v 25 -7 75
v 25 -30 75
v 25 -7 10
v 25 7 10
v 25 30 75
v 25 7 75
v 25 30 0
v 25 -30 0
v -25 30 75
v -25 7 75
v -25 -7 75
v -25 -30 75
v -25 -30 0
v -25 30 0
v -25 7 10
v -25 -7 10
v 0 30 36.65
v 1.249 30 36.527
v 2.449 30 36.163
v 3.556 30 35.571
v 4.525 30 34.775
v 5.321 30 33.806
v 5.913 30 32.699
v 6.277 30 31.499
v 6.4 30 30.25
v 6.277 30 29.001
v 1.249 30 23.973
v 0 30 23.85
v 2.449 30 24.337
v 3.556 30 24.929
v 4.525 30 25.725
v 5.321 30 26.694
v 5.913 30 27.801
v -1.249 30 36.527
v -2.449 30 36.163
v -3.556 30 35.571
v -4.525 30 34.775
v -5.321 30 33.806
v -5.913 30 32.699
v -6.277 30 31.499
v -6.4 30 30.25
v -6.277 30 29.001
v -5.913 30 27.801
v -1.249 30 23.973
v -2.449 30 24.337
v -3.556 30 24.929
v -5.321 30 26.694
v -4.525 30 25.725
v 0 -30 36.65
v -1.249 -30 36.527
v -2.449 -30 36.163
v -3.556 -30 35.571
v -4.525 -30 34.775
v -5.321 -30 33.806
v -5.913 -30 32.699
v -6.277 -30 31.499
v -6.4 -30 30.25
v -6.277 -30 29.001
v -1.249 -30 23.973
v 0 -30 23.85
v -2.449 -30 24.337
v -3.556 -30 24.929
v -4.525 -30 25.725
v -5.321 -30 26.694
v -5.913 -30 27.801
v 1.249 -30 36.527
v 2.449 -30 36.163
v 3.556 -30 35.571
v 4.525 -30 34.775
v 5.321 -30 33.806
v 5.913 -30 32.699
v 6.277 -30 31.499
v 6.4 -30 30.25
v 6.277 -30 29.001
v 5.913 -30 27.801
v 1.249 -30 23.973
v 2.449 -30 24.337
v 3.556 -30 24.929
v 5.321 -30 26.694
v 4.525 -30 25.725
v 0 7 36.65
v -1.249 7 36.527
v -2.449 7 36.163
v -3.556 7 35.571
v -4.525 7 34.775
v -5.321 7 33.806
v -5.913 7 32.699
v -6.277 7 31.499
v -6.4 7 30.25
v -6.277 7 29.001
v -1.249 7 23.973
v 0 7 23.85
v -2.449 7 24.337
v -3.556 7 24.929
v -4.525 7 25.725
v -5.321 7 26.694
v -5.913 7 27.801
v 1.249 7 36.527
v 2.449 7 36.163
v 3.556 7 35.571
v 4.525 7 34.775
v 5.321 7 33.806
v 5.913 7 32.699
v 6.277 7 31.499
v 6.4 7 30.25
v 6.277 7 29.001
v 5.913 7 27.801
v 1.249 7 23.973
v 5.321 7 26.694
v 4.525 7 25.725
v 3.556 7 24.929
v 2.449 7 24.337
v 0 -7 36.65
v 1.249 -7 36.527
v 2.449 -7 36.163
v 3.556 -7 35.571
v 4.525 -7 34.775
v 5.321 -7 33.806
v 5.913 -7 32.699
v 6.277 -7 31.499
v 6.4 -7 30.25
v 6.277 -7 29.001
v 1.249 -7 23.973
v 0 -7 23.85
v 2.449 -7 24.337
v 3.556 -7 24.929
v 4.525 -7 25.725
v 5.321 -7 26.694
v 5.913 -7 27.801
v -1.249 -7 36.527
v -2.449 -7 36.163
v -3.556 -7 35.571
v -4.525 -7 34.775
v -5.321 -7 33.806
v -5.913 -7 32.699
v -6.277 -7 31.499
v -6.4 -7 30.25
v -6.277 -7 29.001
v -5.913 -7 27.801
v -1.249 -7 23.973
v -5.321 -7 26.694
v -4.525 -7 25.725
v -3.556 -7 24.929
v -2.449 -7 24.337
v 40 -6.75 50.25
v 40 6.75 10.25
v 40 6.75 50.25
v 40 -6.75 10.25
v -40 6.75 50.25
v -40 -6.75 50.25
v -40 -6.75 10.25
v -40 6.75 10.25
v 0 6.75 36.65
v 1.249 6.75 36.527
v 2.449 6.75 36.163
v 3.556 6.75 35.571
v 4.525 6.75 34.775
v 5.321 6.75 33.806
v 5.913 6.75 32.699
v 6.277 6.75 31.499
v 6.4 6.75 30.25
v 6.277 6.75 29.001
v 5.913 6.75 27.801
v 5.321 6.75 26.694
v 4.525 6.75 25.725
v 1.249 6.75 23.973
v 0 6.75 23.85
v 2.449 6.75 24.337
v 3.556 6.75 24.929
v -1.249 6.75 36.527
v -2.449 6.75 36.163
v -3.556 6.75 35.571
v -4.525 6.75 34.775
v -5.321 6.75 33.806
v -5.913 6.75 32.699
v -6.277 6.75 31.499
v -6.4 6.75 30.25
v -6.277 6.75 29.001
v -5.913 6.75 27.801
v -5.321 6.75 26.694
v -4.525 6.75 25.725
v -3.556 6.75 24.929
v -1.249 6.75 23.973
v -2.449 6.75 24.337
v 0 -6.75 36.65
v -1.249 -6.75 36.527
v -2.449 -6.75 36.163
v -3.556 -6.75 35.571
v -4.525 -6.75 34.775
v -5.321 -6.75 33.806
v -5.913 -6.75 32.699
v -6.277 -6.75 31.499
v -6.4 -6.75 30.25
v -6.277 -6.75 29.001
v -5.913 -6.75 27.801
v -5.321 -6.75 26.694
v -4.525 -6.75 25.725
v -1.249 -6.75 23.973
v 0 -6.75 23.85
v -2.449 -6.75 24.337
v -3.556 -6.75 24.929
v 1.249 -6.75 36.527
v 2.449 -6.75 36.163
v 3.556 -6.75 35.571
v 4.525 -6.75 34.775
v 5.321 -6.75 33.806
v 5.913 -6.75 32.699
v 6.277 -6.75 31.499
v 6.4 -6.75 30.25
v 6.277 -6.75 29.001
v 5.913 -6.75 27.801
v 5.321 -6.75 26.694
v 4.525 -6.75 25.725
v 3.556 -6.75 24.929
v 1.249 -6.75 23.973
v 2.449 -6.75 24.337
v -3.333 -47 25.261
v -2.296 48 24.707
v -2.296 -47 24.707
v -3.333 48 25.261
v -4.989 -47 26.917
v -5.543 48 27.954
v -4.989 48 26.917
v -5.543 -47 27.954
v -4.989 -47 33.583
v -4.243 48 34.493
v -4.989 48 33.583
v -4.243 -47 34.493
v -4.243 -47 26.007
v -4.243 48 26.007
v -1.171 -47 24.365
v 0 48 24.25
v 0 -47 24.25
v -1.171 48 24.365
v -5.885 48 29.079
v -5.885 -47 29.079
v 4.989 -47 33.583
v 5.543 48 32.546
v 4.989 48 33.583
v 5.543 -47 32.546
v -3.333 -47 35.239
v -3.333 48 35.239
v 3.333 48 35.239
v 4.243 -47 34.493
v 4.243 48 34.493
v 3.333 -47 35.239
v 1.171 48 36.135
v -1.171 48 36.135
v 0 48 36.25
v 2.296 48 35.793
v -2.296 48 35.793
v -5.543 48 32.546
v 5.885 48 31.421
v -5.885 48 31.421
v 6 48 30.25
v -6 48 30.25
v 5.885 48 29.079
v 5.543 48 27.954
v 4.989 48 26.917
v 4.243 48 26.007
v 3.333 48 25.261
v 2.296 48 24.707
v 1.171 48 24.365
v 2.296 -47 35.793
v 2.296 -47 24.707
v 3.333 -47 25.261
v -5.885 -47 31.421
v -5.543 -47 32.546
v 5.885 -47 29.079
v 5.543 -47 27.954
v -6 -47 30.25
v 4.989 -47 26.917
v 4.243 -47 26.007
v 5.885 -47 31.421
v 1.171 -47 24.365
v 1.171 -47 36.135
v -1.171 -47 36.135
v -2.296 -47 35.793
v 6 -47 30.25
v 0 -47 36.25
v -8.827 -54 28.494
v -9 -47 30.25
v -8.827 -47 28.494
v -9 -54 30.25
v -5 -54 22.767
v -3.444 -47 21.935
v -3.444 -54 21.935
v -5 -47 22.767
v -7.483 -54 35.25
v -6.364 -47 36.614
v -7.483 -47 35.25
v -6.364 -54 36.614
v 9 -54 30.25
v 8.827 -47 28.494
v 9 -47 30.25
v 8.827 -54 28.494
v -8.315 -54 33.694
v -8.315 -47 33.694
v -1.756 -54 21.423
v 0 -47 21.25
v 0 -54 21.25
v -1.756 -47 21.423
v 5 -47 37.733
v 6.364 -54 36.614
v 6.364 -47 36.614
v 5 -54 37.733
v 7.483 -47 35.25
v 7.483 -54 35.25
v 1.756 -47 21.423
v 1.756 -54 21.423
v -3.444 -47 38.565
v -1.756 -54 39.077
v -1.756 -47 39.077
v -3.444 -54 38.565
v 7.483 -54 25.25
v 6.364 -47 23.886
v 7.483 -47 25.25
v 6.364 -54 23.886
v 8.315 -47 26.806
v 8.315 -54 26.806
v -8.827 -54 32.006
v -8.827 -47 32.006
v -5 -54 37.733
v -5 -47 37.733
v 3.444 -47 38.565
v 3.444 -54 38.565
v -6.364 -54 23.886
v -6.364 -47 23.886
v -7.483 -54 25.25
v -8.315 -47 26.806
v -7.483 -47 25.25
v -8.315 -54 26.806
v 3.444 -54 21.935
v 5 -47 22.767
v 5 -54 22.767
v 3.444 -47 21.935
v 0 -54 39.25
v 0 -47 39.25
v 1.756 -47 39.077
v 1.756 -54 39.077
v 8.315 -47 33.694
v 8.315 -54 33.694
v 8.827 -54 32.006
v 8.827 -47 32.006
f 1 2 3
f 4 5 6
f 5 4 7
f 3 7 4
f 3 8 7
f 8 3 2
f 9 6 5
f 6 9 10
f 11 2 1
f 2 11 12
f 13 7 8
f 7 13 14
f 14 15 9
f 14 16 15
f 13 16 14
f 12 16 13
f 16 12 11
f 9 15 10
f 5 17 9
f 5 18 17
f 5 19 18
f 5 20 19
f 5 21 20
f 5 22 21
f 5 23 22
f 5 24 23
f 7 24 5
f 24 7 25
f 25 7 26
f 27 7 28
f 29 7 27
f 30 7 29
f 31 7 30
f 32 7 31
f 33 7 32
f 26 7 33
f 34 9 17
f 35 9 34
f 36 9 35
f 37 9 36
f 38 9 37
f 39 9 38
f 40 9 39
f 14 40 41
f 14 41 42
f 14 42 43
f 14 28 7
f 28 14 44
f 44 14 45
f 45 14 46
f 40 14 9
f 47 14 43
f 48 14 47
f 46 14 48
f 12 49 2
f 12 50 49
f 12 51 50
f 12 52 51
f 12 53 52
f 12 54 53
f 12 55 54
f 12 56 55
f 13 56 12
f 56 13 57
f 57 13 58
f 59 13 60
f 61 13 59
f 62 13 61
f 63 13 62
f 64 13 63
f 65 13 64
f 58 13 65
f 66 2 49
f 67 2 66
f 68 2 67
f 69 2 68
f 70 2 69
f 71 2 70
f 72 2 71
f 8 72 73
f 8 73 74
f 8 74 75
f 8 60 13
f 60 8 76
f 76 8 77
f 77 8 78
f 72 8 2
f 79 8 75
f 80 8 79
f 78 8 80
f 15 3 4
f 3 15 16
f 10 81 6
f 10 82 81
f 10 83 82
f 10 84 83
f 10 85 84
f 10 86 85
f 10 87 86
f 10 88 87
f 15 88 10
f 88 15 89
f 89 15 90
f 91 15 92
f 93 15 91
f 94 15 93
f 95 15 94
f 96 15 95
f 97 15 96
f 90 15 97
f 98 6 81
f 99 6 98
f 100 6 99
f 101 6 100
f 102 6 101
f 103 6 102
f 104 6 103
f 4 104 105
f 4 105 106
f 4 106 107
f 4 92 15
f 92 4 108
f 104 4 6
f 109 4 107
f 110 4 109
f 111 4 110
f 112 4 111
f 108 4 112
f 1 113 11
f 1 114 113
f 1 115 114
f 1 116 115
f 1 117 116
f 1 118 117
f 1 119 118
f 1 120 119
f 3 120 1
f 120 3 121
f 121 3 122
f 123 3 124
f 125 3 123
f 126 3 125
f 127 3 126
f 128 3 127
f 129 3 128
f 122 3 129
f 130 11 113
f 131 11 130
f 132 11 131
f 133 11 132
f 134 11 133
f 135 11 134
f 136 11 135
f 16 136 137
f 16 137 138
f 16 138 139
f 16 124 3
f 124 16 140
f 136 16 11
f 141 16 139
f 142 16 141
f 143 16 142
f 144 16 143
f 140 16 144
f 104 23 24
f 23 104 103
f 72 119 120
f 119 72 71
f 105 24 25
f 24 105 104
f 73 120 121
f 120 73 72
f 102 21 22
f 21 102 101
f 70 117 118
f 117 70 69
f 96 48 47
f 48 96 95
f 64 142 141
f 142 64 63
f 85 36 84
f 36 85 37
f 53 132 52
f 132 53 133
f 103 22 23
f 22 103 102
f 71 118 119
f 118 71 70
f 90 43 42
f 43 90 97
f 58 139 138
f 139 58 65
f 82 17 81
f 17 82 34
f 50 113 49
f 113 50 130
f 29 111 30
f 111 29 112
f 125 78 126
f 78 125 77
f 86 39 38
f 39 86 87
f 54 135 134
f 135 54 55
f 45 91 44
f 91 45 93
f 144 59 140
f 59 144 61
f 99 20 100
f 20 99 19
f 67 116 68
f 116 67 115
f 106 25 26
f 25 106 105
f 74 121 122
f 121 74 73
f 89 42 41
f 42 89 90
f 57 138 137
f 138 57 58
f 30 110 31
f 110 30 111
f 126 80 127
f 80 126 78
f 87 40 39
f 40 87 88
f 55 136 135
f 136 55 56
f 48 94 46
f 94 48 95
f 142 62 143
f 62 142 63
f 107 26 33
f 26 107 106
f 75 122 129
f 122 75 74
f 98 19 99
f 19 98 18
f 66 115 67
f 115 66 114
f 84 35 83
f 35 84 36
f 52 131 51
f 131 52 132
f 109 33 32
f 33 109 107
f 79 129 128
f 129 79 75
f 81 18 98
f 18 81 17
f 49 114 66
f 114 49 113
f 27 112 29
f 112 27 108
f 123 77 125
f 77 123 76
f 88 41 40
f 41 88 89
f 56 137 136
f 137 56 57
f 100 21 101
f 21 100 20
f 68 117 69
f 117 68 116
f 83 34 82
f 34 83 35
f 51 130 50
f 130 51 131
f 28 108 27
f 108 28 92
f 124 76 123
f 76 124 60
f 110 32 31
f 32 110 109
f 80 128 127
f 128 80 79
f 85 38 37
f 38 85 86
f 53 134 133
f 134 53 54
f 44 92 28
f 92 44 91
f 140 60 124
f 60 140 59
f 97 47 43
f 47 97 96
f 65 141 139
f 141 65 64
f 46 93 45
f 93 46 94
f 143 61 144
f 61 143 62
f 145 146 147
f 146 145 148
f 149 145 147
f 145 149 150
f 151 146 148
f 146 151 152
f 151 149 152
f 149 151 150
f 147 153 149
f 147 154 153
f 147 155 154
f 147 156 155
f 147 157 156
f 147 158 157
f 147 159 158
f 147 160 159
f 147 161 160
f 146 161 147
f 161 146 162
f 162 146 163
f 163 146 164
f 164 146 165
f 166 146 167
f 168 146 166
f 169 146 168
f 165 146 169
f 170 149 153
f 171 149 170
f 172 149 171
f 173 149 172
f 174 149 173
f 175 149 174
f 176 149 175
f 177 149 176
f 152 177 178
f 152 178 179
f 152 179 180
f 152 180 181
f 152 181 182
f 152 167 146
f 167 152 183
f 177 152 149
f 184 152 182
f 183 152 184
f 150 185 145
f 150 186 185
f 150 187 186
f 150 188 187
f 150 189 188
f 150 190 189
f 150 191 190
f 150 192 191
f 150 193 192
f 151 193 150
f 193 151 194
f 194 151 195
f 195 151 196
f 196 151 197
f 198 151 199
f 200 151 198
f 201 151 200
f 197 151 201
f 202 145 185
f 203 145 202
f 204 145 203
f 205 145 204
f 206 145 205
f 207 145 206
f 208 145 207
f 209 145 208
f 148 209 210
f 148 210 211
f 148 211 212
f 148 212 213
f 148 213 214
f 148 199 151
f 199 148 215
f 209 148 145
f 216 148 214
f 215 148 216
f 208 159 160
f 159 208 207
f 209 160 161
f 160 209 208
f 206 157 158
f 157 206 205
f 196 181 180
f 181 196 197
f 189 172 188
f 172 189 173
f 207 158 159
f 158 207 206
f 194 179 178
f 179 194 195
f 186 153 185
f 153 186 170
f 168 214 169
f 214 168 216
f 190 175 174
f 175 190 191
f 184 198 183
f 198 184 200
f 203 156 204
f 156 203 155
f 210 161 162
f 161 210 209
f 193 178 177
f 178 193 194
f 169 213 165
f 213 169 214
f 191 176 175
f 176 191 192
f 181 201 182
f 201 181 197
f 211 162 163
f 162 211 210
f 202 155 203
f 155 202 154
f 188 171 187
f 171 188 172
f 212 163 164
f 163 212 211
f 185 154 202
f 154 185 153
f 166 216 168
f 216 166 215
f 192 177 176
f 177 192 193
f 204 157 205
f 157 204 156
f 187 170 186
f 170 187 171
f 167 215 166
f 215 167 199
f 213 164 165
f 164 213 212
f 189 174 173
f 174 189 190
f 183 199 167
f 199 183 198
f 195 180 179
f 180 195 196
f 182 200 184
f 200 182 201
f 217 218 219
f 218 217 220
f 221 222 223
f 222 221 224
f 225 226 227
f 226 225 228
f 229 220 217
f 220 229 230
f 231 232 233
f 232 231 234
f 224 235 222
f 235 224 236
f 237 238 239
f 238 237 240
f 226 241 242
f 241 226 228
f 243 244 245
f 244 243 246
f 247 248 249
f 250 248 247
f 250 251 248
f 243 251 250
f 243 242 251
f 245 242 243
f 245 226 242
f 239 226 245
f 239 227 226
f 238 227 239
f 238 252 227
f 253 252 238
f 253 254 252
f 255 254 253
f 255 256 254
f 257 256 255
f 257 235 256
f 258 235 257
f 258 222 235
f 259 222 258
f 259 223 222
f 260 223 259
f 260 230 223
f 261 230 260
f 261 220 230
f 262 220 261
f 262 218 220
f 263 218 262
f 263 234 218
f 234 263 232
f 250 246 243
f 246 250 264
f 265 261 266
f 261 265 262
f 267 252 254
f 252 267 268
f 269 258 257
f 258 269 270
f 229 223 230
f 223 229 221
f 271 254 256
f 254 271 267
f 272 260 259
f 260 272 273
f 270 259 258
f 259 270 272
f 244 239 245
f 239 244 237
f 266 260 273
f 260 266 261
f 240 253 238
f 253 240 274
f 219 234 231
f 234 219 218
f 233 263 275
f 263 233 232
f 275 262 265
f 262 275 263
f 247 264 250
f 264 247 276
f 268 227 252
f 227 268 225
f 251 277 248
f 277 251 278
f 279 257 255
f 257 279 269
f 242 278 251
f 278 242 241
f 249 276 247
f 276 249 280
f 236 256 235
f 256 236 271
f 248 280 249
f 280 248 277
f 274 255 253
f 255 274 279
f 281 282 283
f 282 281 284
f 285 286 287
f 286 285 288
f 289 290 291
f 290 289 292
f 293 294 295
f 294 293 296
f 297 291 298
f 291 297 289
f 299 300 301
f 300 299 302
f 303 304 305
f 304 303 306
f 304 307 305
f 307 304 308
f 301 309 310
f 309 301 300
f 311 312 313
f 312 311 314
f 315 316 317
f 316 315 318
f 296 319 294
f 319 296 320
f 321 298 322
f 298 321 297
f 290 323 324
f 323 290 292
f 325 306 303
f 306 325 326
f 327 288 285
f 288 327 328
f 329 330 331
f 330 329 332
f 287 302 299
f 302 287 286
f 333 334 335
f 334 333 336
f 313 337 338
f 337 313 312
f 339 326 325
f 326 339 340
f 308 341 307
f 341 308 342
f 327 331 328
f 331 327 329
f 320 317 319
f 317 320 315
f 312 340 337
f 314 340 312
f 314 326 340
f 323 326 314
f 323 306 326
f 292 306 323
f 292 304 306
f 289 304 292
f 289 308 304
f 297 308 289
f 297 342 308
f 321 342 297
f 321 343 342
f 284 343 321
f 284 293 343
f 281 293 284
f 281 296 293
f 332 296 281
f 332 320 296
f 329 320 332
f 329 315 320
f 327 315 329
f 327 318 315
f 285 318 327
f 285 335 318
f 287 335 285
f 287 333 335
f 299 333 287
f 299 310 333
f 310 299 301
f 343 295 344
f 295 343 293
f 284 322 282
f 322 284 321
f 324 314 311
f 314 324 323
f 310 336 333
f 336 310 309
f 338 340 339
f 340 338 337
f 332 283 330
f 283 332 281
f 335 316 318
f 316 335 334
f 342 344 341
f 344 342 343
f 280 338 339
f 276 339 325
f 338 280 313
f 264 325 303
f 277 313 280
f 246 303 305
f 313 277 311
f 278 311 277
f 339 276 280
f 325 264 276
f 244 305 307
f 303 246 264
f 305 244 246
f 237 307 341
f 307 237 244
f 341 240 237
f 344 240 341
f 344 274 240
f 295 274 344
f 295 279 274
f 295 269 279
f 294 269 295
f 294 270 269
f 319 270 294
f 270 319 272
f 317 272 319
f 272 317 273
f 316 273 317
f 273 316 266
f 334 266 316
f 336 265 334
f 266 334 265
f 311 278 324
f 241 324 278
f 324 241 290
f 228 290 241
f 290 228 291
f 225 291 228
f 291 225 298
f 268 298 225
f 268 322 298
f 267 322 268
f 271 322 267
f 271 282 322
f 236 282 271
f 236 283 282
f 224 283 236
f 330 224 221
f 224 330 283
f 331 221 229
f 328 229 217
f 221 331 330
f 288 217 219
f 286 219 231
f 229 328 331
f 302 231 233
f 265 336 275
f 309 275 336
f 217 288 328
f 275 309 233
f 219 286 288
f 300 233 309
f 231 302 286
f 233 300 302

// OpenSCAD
$fn = 32;

// ------------------------------------------------------------------------
// Clevis joint: 50 mm clevis, pin d12
// Every part is its own module, assembly() places them once.
// ------------------------------------------------------------------------

// --- part 1 ---
module clevis() {
  difference() {
    translate([-25, -30, 0]) cube([50, 60, 75]);
    translate([-26, -7, 10]) cube([52, 14, 66]);
    translate([0, 0, 30.25]) rotate([90, 0, 0]) cylinder(h = 62, d = 12.8, center = true);
  }
}

// --- part 2 ---
module eye() {
  difference() {
    translate([-40, -6.75, 0]) cube([80, 13.5, 40]);
    translate([0, 0, 20]) rotate([90, 0, 0]) cylinder(h = 15.5, d = 12.8, center = true);
  }
}

// --- part 3 ---
module pin() {
  rotate([0, 90, 0]) cylinder(h = 96, d = 12, center = true);
  translate([-54, 0, 0]) rotate([0, 90, 0]) cylinder(h = 7, d = 18);
}

// --- assembly ---
module assembly() {
  translate([0, 0, 0]) rotate([0, 0, 0]) clevis();
  translate([0, 0, 10.25]) rotate([0, 0, 0]) eye();
  translate([0, 0, 30.25]) rotate([0, 0, 90]) pin();
}

assembly();
